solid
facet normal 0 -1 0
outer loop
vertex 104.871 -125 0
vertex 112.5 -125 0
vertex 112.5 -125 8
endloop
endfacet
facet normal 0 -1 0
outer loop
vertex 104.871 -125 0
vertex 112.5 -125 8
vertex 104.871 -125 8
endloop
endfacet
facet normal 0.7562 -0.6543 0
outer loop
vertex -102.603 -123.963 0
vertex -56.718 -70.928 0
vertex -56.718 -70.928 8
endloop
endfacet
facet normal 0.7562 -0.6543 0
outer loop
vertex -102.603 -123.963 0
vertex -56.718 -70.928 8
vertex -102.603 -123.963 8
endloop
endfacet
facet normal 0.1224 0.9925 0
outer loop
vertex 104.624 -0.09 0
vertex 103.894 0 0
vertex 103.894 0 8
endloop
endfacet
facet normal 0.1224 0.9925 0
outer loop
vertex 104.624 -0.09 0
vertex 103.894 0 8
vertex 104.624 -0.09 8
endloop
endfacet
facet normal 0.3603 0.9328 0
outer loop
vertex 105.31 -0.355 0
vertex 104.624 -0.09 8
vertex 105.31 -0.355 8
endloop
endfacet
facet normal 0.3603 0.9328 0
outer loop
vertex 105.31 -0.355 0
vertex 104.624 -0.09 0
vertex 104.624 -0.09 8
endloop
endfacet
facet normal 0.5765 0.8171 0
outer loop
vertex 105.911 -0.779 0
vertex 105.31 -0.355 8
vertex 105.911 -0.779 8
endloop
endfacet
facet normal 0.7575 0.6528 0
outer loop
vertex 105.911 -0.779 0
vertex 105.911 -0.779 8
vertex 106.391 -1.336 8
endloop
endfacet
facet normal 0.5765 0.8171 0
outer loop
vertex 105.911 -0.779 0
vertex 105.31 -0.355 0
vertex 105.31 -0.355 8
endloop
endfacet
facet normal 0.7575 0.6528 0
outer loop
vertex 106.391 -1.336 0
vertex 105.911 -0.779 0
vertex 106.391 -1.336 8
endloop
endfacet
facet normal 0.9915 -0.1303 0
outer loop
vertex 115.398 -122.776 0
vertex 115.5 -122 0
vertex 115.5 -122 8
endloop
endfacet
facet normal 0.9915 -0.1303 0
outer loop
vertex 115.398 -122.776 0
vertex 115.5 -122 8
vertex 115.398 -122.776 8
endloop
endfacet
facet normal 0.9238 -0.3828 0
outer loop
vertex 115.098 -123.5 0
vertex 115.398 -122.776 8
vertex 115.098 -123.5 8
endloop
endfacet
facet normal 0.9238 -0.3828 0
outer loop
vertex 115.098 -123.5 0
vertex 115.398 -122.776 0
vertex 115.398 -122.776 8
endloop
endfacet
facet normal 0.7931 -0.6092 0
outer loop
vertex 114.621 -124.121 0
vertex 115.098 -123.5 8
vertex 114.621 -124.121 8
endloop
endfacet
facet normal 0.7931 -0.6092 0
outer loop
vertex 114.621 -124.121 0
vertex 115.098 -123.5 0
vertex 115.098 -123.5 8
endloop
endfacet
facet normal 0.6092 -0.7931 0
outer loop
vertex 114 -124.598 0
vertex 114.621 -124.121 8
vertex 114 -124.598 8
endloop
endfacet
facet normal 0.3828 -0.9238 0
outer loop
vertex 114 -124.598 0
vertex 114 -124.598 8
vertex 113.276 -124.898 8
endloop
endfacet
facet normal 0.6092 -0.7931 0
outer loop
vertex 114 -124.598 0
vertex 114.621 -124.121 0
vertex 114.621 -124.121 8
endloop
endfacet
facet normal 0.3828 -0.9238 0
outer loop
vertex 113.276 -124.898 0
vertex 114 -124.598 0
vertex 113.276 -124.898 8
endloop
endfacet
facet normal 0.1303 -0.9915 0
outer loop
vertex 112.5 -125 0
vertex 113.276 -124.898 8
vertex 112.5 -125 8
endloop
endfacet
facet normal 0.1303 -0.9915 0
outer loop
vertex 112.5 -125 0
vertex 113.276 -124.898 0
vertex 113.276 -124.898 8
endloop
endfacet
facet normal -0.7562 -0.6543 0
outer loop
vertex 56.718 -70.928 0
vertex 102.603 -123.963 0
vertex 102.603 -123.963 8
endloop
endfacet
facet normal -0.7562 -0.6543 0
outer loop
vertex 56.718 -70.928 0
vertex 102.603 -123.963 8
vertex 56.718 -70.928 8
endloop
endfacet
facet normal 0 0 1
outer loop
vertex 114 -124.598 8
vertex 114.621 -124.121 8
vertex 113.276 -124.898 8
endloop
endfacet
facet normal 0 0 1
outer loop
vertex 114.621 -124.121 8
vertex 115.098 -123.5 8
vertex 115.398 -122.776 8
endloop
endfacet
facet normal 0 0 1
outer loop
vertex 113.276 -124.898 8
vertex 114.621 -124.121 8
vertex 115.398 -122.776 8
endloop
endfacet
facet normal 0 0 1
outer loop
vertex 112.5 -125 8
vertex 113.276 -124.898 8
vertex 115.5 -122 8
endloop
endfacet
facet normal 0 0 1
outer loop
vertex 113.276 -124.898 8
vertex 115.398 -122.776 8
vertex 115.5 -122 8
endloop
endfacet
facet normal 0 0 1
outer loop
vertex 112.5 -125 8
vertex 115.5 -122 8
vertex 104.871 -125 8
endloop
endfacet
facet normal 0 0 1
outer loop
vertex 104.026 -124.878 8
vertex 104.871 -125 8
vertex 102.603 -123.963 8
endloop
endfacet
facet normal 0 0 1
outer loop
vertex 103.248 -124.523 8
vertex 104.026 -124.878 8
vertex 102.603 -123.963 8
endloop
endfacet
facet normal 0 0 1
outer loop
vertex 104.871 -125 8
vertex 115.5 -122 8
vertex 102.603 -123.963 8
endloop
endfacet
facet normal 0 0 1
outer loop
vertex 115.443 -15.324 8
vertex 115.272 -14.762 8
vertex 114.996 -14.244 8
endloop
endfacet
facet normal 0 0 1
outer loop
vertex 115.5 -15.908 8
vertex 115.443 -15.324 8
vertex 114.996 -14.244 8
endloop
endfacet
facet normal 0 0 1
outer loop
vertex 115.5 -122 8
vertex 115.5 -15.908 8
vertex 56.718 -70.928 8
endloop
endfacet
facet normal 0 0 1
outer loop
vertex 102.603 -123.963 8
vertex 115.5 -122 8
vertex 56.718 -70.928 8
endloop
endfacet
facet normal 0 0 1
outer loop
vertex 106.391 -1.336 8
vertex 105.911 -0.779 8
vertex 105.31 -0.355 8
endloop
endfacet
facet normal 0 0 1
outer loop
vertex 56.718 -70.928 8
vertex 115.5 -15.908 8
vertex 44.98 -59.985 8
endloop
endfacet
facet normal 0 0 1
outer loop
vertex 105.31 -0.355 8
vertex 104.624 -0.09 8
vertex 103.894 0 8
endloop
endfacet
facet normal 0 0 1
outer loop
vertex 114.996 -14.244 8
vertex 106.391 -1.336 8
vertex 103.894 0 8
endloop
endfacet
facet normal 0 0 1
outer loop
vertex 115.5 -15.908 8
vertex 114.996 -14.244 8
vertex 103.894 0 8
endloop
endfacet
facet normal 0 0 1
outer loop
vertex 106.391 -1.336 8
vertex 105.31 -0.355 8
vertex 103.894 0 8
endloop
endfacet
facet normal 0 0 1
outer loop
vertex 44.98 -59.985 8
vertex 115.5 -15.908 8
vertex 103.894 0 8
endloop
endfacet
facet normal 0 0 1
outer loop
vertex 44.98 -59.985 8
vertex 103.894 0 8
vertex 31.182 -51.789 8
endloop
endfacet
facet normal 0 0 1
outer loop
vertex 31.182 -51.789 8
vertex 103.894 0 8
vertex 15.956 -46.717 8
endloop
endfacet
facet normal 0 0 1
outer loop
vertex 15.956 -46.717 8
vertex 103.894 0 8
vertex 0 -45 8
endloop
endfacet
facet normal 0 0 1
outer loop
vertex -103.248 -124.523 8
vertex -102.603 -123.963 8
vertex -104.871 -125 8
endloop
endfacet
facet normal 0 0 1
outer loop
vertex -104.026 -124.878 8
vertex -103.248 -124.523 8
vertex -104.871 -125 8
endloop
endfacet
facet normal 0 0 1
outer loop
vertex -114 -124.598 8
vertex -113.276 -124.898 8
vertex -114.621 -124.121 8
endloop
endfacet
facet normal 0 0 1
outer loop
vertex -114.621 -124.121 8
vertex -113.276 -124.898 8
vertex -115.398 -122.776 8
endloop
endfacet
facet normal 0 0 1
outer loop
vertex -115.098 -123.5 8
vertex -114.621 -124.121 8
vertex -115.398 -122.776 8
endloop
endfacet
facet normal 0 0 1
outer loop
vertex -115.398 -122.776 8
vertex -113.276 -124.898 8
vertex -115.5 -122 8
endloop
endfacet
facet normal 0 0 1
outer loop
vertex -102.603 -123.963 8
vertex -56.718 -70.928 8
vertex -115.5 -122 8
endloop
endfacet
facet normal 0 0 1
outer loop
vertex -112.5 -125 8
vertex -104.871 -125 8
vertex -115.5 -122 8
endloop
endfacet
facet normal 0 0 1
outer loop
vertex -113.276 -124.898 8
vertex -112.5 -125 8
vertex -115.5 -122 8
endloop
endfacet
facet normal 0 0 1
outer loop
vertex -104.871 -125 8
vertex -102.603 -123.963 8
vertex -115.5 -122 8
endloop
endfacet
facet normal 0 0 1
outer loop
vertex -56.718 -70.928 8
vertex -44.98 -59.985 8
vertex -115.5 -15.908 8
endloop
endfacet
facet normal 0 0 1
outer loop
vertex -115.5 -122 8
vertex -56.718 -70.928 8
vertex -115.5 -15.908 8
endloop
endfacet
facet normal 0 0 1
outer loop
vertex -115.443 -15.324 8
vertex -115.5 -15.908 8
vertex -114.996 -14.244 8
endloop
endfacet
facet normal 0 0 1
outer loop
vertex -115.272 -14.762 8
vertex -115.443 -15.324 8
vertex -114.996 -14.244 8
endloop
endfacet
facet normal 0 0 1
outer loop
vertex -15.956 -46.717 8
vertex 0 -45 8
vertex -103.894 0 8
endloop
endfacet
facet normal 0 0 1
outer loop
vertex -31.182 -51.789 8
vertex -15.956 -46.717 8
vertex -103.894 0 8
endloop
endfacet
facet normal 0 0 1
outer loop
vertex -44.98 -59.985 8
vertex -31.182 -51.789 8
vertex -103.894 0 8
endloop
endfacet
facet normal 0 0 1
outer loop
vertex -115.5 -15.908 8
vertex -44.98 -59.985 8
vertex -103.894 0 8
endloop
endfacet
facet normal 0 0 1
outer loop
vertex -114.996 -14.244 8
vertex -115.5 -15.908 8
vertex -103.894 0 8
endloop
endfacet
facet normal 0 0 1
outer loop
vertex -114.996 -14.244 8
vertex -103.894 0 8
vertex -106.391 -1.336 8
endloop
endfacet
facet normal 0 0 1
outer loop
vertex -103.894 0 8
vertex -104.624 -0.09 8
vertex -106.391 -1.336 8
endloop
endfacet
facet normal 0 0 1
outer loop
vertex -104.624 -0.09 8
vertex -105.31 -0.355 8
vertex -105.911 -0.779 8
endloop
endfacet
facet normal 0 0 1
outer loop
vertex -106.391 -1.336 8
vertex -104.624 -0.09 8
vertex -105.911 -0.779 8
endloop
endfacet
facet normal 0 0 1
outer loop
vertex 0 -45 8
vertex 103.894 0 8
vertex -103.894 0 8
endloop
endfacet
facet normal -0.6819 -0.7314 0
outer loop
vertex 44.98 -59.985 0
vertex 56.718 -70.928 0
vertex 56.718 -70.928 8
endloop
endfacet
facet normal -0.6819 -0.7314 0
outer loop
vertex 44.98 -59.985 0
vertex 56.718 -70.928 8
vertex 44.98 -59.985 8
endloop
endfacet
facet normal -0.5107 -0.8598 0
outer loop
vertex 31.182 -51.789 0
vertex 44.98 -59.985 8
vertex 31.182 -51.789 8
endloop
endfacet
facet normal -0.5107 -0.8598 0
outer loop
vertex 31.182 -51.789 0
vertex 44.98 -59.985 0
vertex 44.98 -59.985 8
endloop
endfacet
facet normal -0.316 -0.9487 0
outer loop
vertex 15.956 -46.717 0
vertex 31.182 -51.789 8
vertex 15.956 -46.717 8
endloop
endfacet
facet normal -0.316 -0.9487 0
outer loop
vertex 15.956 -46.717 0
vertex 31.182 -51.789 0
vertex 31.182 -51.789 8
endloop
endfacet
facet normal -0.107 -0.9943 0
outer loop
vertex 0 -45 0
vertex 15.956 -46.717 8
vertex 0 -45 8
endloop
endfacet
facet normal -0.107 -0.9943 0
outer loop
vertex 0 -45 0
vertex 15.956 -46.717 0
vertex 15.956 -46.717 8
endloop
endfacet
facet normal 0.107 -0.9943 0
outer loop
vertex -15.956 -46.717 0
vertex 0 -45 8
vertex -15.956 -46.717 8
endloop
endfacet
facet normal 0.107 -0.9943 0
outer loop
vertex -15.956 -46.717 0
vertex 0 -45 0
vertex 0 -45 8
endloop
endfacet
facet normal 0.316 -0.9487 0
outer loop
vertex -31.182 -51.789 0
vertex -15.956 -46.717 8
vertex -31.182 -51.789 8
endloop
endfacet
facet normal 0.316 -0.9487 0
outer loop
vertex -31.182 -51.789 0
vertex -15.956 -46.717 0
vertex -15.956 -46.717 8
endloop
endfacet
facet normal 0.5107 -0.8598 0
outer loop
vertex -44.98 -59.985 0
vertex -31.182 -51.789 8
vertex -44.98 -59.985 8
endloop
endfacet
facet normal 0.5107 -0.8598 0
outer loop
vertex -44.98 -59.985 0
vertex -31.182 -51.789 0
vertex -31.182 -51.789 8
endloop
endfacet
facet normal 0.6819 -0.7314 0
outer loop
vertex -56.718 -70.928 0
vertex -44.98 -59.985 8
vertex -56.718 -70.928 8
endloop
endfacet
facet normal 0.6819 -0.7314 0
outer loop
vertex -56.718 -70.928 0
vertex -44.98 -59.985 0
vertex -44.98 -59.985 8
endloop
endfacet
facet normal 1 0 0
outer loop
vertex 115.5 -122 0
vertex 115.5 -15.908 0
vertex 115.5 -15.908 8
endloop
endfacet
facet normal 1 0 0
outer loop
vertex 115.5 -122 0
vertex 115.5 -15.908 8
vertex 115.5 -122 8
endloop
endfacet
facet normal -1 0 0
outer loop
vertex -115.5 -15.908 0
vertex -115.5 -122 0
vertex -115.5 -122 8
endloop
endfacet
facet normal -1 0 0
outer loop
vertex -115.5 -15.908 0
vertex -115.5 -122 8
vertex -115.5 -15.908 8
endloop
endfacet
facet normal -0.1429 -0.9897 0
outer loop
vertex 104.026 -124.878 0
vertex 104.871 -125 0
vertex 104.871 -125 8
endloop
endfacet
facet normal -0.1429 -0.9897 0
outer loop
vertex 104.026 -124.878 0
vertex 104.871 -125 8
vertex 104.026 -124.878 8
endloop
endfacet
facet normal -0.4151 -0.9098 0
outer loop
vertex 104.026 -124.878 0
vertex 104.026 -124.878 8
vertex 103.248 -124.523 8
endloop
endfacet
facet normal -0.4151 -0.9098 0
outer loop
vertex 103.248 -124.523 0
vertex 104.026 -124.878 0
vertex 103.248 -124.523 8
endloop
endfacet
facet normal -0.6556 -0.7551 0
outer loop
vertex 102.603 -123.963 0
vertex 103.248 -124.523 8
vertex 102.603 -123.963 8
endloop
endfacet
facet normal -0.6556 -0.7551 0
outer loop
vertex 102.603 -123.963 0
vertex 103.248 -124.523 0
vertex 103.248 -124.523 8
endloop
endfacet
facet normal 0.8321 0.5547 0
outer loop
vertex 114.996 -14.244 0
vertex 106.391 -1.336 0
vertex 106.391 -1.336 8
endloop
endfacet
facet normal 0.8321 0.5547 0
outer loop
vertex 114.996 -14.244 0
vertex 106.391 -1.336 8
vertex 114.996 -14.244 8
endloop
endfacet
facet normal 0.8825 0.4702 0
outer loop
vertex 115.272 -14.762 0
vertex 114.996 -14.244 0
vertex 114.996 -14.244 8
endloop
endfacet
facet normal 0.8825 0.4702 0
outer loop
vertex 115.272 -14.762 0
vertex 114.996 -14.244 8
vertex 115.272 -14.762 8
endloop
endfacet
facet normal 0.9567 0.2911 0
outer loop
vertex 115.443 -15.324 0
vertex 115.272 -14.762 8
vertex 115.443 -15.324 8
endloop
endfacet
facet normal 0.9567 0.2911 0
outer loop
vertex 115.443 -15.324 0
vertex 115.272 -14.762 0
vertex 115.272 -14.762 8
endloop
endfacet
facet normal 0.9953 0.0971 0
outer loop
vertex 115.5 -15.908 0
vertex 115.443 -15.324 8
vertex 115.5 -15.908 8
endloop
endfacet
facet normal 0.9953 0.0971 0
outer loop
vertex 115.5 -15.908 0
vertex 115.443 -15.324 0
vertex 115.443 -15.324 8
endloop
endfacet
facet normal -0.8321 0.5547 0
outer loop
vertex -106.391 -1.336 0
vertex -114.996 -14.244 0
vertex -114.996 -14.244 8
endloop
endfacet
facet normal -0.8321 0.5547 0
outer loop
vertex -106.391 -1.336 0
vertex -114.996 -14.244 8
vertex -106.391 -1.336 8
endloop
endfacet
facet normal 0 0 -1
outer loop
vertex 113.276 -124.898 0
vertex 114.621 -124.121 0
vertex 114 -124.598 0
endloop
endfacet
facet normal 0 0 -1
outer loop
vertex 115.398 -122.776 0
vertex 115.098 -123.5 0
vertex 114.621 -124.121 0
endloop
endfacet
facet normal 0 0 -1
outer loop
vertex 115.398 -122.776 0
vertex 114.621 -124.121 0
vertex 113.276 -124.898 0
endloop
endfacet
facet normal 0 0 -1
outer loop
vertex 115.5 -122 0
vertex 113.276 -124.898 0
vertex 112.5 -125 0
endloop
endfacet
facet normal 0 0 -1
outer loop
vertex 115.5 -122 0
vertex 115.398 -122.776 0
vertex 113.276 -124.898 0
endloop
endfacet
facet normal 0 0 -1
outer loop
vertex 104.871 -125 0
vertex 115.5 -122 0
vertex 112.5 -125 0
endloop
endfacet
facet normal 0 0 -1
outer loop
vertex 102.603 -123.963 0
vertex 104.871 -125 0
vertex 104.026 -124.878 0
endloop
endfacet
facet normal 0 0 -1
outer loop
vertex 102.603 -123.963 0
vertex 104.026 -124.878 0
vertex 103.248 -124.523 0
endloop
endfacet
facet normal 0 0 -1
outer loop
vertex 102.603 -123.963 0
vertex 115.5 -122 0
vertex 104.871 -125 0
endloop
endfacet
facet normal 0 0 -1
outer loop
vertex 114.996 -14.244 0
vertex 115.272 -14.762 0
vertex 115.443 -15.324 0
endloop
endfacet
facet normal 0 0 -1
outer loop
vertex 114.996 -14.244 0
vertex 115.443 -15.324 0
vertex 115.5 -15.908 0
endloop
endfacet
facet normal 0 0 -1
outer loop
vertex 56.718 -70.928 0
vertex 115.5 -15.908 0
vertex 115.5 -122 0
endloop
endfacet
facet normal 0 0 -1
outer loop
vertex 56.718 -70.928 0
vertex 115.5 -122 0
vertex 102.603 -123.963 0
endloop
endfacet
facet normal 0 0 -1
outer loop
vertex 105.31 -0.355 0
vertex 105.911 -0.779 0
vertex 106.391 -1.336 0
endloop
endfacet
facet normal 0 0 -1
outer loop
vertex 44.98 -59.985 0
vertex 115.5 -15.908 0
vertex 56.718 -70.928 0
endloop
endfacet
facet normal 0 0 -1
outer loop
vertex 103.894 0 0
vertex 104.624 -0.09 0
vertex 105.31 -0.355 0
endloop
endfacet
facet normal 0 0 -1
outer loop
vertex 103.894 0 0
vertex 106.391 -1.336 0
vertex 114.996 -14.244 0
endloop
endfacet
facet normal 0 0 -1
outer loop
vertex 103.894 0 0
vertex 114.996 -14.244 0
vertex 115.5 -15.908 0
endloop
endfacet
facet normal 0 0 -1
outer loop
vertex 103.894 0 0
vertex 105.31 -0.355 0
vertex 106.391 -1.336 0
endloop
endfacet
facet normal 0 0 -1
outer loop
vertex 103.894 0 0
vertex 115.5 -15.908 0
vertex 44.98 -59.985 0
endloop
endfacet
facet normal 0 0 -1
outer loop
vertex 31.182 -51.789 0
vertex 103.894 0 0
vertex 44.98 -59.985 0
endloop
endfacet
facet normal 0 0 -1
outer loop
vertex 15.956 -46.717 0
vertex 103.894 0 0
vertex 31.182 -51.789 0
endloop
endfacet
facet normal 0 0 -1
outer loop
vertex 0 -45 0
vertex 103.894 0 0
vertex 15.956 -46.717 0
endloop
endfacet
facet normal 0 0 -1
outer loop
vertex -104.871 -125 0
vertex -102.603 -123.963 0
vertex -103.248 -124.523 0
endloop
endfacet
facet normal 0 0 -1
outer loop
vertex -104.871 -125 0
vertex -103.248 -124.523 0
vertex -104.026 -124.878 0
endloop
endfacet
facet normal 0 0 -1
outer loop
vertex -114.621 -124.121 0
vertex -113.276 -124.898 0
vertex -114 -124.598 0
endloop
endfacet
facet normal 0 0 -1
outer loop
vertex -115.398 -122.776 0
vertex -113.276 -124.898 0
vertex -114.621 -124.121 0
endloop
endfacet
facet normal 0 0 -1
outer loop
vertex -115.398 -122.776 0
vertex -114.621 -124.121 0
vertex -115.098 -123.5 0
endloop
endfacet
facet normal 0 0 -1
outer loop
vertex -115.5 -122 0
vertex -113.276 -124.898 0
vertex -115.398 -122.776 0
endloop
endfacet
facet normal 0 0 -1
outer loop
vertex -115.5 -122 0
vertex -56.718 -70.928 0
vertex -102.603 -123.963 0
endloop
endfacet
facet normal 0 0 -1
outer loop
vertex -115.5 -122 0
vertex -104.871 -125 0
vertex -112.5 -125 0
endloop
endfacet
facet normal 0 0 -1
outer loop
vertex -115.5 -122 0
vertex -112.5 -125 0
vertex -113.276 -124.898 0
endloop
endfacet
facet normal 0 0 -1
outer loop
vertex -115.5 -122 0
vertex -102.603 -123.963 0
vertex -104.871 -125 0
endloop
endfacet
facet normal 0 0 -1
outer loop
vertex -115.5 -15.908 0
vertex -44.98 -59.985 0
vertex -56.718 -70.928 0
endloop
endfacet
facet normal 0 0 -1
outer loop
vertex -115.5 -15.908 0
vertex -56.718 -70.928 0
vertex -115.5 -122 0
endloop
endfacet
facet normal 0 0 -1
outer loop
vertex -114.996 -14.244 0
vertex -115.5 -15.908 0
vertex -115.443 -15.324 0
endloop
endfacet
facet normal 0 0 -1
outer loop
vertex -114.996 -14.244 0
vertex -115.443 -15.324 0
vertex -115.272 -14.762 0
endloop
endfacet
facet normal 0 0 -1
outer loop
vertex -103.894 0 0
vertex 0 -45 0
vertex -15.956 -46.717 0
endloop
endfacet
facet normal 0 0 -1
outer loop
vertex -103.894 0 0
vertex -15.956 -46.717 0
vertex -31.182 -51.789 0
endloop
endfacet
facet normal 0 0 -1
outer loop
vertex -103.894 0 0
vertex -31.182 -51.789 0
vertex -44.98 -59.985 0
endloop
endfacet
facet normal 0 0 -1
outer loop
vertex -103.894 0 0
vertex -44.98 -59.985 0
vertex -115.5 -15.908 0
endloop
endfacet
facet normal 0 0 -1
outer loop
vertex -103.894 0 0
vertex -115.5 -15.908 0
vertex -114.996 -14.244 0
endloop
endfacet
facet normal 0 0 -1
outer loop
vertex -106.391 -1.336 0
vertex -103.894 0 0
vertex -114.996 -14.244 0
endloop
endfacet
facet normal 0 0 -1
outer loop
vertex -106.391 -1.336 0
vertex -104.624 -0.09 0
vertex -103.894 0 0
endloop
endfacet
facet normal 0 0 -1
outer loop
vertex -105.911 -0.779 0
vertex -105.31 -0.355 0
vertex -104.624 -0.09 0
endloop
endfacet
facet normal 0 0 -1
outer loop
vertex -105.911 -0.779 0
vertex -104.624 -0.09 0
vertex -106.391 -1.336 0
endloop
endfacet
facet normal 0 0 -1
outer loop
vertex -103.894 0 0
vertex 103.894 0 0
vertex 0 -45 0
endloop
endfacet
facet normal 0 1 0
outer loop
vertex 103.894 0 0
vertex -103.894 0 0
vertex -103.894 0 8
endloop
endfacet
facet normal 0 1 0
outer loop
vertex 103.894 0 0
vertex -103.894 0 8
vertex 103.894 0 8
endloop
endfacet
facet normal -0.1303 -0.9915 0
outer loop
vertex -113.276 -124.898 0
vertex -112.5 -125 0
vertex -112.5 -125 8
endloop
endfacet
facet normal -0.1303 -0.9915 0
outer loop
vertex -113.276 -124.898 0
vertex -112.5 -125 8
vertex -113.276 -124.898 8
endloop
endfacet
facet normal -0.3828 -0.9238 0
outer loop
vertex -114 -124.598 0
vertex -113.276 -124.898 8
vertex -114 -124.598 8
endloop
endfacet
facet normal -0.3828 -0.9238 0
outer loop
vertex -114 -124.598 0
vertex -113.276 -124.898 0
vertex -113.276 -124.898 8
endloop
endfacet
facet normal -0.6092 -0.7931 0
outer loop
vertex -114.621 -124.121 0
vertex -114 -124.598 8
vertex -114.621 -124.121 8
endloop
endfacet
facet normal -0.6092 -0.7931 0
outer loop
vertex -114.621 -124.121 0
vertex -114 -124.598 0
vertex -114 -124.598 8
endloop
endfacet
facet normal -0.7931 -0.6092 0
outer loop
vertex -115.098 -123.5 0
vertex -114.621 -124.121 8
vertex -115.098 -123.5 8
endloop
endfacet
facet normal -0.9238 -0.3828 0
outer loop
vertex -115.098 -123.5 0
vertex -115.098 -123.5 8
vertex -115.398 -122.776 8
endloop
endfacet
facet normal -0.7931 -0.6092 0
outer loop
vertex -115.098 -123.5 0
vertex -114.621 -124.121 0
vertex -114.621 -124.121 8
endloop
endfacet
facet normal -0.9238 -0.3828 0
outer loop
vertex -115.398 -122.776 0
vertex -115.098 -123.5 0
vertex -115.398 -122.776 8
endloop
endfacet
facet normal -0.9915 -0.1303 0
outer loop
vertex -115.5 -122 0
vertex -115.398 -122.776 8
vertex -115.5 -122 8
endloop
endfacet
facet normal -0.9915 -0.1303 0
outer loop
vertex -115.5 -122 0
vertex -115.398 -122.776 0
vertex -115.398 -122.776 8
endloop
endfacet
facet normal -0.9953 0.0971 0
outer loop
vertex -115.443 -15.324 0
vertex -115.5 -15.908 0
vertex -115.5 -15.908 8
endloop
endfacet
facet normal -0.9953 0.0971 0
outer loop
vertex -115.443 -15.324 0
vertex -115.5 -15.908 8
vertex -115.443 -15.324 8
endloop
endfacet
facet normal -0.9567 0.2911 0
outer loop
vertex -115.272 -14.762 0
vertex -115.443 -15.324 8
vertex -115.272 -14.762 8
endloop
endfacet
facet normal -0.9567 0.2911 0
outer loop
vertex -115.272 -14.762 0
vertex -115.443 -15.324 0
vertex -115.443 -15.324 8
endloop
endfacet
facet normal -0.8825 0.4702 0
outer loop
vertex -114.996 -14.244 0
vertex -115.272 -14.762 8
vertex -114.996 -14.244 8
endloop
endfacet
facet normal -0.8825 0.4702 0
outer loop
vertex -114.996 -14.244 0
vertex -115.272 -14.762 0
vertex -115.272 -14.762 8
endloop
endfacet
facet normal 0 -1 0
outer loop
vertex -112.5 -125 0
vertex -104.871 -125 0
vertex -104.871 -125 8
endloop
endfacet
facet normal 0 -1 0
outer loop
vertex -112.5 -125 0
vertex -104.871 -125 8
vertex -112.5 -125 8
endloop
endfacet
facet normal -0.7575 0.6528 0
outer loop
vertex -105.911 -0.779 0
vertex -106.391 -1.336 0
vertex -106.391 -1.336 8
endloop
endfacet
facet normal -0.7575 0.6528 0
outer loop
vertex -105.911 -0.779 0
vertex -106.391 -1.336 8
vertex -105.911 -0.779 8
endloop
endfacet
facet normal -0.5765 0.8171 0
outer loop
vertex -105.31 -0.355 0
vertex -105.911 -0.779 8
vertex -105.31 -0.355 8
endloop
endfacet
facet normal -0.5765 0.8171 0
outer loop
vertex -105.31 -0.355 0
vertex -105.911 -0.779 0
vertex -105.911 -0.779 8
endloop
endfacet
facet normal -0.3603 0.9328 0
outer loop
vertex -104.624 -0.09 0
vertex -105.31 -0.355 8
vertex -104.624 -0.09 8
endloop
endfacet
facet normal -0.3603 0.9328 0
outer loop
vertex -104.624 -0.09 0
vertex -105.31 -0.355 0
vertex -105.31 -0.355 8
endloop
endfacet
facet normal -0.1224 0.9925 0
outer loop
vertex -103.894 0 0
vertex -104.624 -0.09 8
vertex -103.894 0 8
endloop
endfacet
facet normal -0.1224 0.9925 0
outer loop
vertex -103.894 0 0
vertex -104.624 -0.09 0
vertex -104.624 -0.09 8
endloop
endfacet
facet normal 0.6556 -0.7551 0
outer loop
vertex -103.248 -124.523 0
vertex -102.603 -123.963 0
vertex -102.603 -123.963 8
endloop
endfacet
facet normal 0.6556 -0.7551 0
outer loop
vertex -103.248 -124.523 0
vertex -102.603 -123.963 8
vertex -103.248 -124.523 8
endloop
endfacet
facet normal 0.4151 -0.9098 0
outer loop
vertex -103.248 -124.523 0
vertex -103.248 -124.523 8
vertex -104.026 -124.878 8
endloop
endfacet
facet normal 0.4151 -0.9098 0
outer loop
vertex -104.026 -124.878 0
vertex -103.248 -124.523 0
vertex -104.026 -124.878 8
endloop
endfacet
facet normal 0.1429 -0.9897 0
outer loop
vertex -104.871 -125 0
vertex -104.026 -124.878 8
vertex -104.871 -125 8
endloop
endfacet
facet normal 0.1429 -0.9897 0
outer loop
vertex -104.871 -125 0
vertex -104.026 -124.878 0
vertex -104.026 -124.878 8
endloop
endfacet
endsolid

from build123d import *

# Parameters (mm, degrees)
EXTRUDE1_DEPTH = 8


with BuildPart() as part:
    # Sketch1 → Extrude1 (new body)
    with BuildSketch(Plane.XY):
        with BuildLine():
            Line((-103.894448725, 0), (103.894448725, 0))
            ThreePointArc((103.894448725, 0), (105.310022501, -0.354976204), (106.390599608, -1.335899411))
            Line((106.390599608, -1.335899411), (114.996150883, -14.244226325))
            ThreePointArc((114.996150883, -14.244226325), (115.371276079, -15.038974467), (115.5, -15.908326913))
            Line((115.5, -15.908326913), (115.5, -122))
            ThreePointArc((115.5, -122), (114.621320344, -124.121320344), (112.5, -125))
            Line((112.5, -125), (104.871428571, -125))
            ThreePointArc((104.871428571, -125), (103.624149291, -124.728423427), (102.602691232, -123.96286293))
            Line((102.602691232, -123.96286293), (56.718433491, -70.928426739))
            ThreePointArc((56.718433491, -70.928426739), (0, -45), (-56.718433491, -70.928426739))
            Line((-56.718433491, -70.928426739), (-102.602691232, -123.96286293))
            ThreePointArc((-102.602691232, -123.96286293), (-103.624149291, -124.728423427), (-104.871428571, -125))
            Line((-104.871428571, -125), (-112.5, -125))
            ThreePointArc((-112.5, -125), (-114.621320344, -124.121320344), (-115.5, -122))
            Line((-115.5, -122), (-115.5, -15.908326913))
            ThreePointArc((-115.5, -15.908326913), (-115.371276079, -15.038974467), (-114.996150883, -14.244226325))
            Line((-114.996150883, -14.244226325), (-106.390599608, -1.335899411))
            ThreePointArc((-106.390599608, -1.335899411), (-105.310022501, -0.354976204), (-103.894448725, 0))
        make_face()
    extrude(amount=EXTRUDE1_DEPTH)


solid = part.part
